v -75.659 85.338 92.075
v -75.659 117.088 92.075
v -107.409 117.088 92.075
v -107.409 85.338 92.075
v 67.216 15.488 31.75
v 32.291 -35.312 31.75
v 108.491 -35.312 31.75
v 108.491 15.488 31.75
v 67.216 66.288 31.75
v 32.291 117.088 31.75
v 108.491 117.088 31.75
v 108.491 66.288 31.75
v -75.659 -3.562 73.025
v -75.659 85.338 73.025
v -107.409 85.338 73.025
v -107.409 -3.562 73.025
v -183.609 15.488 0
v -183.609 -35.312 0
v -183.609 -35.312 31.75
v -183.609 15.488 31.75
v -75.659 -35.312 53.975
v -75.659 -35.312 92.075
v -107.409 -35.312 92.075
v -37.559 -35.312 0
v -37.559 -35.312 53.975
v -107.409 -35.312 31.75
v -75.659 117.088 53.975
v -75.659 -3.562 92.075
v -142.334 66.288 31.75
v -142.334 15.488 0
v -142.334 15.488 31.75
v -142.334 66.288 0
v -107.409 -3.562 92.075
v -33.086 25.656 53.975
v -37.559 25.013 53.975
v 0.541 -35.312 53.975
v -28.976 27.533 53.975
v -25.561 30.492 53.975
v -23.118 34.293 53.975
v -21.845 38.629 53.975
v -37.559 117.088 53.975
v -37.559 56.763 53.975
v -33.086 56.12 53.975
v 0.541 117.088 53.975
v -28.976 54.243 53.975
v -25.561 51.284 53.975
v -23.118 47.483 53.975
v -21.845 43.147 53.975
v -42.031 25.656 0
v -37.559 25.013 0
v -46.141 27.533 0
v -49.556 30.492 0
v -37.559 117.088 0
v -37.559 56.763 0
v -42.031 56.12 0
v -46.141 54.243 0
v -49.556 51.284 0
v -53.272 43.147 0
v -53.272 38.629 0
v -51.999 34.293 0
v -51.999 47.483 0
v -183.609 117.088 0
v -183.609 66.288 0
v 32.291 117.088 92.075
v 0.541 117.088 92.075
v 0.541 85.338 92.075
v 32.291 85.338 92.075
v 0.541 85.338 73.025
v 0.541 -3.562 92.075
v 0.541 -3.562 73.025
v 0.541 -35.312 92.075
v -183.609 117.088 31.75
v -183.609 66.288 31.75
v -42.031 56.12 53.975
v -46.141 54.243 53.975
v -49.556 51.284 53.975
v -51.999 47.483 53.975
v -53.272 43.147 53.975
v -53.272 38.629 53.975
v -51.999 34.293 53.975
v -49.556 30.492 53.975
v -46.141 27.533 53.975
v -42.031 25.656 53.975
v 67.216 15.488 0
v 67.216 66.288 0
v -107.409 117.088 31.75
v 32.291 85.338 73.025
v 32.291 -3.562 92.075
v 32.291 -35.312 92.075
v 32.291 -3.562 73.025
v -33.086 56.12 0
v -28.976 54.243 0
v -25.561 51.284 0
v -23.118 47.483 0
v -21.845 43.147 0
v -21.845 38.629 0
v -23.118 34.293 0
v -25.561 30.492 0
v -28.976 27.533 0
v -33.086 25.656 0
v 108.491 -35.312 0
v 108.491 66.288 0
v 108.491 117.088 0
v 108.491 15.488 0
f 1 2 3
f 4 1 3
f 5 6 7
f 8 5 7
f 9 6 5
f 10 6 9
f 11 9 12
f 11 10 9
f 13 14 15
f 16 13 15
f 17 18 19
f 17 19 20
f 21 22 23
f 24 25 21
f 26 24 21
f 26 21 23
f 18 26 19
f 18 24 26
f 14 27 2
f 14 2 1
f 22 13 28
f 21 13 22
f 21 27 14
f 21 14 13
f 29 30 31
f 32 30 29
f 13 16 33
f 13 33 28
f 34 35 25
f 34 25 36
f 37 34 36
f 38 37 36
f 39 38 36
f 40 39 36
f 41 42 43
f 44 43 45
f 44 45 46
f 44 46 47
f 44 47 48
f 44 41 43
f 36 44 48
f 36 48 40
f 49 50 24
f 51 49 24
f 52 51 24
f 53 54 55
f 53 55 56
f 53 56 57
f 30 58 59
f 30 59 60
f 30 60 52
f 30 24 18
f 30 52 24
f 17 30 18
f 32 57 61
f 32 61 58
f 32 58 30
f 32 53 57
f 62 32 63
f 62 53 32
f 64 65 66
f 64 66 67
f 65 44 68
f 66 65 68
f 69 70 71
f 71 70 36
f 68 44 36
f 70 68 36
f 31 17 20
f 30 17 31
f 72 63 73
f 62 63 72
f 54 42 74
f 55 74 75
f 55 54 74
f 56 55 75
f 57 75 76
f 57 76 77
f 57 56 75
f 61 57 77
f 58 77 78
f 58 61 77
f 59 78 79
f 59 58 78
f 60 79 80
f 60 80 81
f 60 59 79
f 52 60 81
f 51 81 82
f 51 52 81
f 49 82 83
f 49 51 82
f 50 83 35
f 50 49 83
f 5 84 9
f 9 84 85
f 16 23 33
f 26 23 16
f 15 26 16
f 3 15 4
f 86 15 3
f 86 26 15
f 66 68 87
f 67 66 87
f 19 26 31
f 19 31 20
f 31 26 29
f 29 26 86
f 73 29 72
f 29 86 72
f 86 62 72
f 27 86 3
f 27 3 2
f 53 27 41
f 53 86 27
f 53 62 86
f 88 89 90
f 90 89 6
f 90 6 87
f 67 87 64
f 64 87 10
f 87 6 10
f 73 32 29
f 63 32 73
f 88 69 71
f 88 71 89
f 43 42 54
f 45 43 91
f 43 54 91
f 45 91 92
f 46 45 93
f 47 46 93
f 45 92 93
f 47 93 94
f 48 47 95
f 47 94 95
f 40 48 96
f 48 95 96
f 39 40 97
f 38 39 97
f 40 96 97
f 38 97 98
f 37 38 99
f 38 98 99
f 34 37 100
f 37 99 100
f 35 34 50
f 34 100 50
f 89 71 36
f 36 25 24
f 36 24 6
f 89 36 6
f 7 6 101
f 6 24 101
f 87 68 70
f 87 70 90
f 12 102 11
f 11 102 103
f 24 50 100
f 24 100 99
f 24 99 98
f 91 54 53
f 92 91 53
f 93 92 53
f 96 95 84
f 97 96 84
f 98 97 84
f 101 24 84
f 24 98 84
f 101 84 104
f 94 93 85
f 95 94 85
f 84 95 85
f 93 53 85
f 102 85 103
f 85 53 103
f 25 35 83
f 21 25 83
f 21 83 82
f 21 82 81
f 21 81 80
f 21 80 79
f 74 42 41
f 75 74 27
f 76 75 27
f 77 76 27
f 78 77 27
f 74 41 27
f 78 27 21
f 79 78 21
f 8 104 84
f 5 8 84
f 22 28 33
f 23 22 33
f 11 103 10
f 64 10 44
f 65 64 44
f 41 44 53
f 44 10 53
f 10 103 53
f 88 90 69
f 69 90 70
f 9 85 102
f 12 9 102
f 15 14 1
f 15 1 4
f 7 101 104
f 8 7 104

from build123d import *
from build123d import SkipClean  # not in build123d's __all__

# Parameters (mm, degrees)
F1_DEPTH = 31.75
F2_DEPTH = 53.975
F3_DEPTH = 73.025
F0_W     = 31.75
F0_H     = 31.75
F4_DEPTH = 92.075
F5_DEPTH = 73.025


with BuildPart() as f1:
    # F0 (on Top) → F1 (new body)
    with BuildSketch(Plane.XY):
        Polygon((108.4912913322, 117.0880892358), (32.2912913322, 117.0880892358), (32.2912913322, 85.3380892358), (32.2912913322, 15.4880892358), (32.2912913322, -3.5619107642), (32.2912913322, -16.2619107642), (32.2912913322, -35.3119107642), (108.4912913322, -35.3119107642), (108.4912913322, 15.4880892358), (67.2162913322, 15.4880892358), (67.2162913322, 66.2880892358), (108.4912913322, 66.2880892358), align=None)
    extrude(amount=F1_DEPTH)



with BuildPart() as f2:
    # F0 (on Top) → F2 (new body)
    with BuildSketch(Plane.XY):
        with BuildLine():
            Line((0.5412913322, 117.0880892358), (-37.5587086678, 117.0880892358))
            Line((-37.5587086678, 117.0880892358), (-37.5587086678, 56.7630892358))
            ThreePointArc((-37.5587086678, 56.7630892358), (-21.6837086678, 40.8880892358), (-37.5587086678, 25.0130892358))
            Line((-37.5587086678, 25.0130892358), (-37.5587086678, -35.3119107642))
            Line((-37.5587086678, -35.3119107642), (0.5412913322, -35.3119107642))
            Line((0.5412913322, -35.3119107642), (0.5412913322, -3.5619107642))
            Line((0.5412913322, -3.5619107642), (0.5412913322, 15.4880892358))
            Line((0.5412913322, 15.4880892358), (0.5412913322, 85.3380892358))
            Line((0.5412913322, 85.3380892358), (0.5412913322, 117.0880892358))
        make_face()
    extrude(amount=F2_DEPTH)


with BuildPart() as f1_1:
    add(f1.part, clean=False)

    add(f2.part)  # F3 merges F2
    # F0 (on Top) → F3 (join)
    with BuildSketch(Plane.XY):
        Polygon((32.2912913322, 85.3380892358), (0.5412913322, 85.3380892358), (0.5412913322, 15.4880892358), (0.5412913322, -3.5619107642), (32.2912913322, -3.5619107642), (32.2912913322, 15.4880892358), align=None)
    extrude(amount=F3_DEPTH)

    # F0 (on Top) → F4 (join)
    with BuildSketch(Plane.XY):
        Polygon((32.2912913322, -3.5619107642), (0.5412913322, -3.5619107642), (0.5412913322, -35.3119107642), (32.2912913322, -35.3119107642), (32.2912913322, -16.2619107642), align=None)
        with Locations((16.4162913322, 101.2130892358)):
            Rectangle(F0_W, F0_H)
    extrude(amount=F4_DEPTH)

    # F0 (on Top) → F5 (join)
    with BuildSketch(Plane.XY):
        Polygon((32.2912913322, 85.3380892358), (0.5412913322, 85.3380892358), (0.5412913322, 15.4880892358), (0.5412913322, -3.5619107642), (32.2912913322, -3.5619107642), (32.2912913322, 15.4880892358), align=None)
    extrude(amount=F5_DEPTH)

    # F6: F1 across face


with BuildPart() as f1_2:
    add(f1_1.part, clean=False)
    with SkipClean():  # cleaning this boolean's faces spoils the solid; the shape is the same uncleaned
        add(f1_1.part.mirror(Plane(origin=(-37.5587086678, 86.9255892358, 26.9875), x_dir=(0, -1, 0), z_dir=(-1, 0, 0))), clean=False)


solid = f1_2.part
